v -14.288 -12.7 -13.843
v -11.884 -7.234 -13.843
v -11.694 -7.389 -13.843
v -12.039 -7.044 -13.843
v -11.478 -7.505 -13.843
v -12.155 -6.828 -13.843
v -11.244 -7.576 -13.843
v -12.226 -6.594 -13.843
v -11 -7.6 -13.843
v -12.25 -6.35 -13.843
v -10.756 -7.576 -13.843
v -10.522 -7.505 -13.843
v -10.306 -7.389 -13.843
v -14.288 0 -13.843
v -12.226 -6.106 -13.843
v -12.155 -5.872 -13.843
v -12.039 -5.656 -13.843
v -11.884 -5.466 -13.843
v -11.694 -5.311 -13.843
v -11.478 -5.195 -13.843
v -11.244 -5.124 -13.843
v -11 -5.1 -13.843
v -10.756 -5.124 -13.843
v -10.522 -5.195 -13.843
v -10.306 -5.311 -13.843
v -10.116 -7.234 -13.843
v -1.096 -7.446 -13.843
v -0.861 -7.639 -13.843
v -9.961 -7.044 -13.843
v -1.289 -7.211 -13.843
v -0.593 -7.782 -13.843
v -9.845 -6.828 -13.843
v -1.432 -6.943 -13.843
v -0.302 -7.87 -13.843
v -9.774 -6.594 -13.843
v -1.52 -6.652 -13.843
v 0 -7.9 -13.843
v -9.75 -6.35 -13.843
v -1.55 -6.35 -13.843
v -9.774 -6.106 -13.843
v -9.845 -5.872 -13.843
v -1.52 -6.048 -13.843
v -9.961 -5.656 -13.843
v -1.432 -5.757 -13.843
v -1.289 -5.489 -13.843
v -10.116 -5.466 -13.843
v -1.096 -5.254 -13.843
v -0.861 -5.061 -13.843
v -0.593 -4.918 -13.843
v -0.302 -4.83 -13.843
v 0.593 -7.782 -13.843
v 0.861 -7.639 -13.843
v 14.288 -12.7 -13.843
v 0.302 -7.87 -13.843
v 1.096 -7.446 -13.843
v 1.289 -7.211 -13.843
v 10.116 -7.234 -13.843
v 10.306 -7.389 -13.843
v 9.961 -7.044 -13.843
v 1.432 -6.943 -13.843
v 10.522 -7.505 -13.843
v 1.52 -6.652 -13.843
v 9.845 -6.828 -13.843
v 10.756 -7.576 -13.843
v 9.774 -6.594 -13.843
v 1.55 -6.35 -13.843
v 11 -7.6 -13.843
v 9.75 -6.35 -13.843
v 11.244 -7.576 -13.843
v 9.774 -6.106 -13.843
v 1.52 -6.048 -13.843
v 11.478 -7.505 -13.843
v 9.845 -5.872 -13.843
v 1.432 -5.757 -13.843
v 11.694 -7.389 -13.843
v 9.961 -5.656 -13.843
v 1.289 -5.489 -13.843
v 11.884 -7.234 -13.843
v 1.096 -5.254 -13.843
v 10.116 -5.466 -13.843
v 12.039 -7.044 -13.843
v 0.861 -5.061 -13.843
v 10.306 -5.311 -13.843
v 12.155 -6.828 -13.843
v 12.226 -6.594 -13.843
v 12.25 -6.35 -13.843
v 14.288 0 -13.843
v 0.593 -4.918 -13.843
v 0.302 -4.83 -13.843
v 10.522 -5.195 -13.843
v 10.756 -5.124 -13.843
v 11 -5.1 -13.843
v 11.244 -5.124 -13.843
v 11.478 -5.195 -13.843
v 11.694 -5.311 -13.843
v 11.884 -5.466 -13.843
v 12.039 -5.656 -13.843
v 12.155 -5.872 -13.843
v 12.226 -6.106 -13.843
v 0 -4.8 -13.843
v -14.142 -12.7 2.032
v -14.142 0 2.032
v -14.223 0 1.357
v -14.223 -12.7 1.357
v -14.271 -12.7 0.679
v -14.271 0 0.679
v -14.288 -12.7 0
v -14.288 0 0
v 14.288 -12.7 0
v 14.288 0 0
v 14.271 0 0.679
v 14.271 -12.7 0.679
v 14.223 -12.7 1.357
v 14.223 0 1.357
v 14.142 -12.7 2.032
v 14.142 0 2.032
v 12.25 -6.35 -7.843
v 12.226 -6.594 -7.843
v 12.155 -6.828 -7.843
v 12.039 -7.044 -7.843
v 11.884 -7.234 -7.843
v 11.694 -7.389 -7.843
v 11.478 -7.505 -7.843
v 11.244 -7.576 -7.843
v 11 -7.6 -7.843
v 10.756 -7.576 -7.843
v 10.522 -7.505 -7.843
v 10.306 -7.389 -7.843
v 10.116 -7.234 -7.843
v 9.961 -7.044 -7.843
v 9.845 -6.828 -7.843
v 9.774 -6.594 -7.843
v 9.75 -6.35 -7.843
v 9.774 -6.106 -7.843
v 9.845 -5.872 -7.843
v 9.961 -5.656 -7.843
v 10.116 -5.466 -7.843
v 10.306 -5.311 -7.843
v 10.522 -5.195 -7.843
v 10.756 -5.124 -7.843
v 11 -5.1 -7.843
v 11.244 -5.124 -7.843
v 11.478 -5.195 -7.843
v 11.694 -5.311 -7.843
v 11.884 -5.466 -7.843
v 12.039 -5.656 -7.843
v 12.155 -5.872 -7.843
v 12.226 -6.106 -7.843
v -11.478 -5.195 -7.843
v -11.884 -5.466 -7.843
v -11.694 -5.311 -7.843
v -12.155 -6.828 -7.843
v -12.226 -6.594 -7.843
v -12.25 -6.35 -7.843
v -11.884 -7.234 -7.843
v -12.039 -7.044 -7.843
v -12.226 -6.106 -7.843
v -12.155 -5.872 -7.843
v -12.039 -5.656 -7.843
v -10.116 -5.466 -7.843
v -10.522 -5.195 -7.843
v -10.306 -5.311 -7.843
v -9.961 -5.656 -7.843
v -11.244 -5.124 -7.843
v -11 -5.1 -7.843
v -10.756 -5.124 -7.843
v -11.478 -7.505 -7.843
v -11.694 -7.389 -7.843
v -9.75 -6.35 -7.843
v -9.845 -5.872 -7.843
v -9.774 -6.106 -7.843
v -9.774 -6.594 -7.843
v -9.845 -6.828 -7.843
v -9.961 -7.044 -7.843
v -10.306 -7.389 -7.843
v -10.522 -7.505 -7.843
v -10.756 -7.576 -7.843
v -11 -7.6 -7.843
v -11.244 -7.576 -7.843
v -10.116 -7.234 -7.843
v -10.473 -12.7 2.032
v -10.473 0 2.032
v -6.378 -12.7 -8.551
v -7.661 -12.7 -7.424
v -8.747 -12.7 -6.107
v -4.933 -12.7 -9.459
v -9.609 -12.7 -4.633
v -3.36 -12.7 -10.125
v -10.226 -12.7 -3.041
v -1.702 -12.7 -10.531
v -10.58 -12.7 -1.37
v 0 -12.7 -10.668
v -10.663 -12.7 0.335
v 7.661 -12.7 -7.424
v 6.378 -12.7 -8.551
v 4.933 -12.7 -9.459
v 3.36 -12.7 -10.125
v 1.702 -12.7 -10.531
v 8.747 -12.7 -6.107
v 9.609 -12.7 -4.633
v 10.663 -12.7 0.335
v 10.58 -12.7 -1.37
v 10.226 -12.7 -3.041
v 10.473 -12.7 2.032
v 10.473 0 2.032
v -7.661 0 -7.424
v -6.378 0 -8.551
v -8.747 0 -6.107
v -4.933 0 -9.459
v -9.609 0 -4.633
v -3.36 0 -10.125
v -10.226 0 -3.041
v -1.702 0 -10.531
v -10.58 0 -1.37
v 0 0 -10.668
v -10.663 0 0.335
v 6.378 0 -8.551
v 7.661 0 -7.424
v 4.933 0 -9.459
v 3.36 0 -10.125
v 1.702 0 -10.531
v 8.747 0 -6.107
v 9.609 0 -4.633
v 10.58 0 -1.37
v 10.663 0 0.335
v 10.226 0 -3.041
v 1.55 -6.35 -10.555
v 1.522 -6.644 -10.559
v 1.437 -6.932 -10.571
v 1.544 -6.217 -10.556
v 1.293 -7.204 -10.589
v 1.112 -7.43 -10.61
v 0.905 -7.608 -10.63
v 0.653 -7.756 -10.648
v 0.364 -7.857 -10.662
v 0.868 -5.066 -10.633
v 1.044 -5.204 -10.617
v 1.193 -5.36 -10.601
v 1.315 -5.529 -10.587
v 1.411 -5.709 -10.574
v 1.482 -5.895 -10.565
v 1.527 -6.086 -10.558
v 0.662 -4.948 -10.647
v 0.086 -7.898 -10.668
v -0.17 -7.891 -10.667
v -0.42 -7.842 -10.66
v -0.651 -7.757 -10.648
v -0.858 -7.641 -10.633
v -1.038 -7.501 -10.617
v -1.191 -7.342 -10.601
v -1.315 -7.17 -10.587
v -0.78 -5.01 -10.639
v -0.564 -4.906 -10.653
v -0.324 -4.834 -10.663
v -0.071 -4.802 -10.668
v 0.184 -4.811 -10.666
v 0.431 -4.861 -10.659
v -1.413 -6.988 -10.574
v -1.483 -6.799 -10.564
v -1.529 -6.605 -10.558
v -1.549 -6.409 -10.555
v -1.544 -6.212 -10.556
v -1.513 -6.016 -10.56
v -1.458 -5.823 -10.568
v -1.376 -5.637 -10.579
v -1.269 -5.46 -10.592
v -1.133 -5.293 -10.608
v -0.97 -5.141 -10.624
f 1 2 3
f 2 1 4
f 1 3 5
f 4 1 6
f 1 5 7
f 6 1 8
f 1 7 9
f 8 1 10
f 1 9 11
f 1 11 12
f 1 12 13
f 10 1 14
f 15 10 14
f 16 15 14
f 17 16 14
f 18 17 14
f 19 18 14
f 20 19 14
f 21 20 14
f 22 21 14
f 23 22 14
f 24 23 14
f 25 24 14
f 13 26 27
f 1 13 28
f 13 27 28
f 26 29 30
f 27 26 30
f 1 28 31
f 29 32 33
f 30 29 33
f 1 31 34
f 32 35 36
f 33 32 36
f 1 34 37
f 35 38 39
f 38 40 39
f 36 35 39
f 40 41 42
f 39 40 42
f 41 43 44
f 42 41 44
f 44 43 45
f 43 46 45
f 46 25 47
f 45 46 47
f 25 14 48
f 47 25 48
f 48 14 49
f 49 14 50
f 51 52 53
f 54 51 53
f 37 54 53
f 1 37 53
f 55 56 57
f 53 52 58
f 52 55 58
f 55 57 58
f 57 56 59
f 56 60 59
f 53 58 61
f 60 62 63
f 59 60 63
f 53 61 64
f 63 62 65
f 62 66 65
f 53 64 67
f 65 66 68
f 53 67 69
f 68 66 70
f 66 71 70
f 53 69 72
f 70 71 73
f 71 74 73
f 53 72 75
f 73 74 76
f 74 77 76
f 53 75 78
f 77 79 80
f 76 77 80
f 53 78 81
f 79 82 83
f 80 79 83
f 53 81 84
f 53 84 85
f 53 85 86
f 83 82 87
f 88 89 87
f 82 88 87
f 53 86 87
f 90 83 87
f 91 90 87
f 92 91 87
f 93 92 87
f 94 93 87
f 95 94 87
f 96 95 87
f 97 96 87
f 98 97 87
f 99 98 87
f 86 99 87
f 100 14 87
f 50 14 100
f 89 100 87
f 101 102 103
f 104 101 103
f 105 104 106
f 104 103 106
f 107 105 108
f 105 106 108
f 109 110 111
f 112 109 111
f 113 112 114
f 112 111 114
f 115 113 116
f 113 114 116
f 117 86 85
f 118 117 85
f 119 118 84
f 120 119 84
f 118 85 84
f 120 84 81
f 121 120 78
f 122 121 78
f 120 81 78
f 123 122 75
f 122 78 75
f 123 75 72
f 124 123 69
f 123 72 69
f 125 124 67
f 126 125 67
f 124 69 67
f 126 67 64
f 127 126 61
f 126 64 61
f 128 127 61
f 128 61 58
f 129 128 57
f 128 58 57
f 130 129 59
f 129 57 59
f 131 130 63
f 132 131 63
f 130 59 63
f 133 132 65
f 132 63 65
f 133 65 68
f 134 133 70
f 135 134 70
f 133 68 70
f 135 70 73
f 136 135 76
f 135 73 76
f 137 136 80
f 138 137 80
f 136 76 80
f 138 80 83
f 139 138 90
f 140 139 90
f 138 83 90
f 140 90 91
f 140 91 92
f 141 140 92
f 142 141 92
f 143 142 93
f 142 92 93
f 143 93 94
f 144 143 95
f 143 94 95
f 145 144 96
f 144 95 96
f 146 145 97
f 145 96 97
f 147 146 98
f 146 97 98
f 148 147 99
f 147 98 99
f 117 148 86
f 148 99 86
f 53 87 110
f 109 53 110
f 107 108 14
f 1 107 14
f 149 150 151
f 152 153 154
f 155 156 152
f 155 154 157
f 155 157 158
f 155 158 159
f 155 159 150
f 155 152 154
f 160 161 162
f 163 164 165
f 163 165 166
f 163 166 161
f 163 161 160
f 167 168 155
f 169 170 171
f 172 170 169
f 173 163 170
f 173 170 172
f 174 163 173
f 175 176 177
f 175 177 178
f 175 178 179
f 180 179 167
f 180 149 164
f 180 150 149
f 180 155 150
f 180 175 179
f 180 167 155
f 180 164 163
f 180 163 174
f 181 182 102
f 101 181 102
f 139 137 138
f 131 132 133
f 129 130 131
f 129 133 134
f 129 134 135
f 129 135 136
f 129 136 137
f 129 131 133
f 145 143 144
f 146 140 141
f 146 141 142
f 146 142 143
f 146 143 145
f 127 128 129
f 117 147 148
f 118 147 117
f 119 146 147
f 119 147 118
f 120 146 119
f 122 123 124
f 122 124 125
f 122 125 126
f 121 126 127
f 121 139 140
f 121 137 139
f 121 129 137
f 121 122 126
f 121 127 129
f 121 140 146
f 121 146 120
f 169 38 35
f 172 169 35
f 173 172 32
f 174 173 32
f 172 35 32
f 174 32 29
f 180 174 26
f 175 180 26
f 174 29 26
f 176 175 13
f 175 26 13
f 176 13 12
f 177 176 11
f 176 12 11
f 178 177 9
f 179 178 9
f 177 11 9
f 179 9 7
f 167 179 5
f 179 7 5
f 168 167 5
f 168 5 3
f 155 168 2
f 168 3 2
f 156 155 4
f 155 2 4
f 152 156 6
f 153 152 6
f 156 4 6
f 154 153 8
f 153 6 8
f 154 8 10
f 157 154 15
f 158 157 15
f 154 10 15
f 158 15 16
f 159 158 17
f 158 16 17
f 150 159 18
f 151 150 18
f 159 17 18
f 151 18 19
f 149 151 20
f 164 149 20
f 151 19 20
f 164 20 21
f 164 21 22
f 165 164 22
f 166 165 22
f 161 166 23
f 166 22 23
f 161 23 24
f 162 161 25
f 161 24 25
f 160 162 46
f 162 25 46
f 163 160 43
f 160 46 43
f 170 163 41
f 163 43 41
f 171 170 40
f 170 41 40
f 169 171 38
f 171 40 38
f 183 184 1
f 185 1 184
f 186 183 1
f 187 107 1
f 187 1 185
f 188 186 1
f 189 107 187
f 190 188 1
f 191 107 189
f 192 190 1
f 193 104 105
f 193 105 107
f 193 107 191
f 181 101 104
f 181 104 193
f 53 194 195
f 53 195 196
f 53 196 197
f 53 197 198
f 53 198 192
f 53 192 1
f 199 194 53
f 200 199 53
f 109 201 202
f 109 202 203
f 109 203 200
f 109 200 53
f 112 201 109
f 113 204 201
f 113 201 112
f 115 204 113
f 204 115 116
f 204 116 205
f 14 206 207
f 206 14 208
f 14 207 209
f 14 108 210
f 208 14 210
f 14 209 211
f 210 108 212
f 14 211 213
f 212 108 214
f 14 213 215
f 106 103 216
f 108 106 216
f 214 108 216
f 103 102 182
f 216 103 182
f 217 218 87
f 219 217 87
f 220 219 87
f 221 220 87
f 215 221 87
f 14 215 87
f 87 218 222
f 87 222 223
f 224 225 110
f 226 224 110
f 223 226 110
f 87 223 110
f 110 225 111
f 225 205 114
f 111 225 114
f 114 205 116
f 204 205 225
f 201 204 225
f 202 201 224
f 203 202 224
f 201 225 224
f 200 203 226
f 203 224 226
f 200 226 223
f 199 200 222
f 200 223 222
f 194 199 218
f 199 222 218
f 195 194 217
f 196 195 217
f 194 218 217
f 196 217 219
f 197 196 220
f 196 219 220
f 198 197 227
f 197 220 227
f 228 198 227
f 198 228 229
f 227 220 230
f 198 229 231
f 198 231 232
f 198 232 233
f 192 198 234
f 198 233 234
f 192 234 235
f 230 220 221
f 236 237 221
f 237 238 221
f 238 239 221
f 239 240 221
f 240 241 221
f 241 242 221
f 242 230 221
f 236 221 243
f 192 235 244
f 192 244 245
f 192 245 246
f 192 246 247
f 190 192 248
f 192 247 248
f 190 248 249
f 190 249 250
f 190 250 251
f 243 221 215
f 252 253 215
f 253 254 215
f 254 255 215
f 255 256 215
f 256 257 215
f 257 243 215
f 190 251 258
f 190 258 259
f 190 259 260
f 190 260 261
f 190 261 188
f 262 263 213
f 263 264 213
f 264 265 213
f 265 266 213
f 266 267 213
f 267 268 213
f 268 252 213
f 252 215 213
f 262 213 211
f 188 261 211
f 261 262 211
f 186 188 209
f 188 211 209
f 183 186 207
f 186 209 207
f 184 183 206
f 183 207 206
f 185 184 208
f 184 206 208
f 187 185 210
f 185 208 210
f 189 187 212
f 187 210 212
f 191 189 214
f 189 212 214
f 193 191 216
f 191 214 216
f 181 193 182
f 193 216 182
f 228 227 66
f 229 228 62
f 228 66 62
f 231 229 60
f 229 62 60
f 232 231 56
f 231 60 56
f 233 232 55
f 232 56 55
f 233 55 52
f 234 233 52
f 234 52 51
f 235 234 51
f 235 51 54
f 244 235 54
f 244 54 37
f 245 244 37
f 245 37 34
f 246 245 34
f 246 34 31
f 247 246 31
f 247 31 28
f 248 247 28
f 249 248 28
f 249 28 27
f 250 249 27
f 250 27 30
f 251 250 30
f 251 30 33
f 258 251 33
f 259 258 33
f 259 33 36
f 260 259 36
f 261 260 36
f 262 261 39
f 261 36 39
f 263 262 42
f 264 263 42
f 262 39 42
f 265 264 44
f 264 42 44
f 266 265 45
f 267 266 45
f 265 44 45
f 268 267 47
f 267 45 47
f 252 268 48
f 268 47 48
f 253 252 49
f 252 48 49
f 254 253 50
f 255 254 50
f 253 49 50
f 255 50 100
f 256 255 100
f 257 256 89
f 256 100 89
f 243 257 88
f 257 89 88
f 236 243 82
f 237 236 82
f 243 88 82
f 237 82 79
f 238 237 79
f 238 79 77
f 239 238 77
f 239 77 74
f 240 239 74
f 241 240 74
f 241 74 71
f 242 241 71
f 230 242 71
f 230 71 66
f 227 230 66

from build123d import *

# Parameters (mm, degrees)
F1_DEPTH = 12.7
F2_R     = 1.25
F2_R_2   = 1.55
F3_DEPTH = 6


with BuildPart() as f1:
    # F0 (on Front) → F1 (new body)
    with BuildSketch(Plane.XZ):
        with BuildLine():
            ThreePointArc((10.472688, 2.032), (0, -10.668), (-10.472688, 2.032))
            Line((-10.472688, 2.032), (-14.142264, 2.032))
            ThreePointArc((-14.142264, 2.032), (-14.251145, 1.018592), (-14.2875, 0))
            Line((-14.2875, 0), (-14.2875, -13.843))
            Line((-14.2875, -13.843), (14.2875, -13.843))
            Line((14.2875, -13.843), (14.2875, 0))
            ThreePointArc((14.2875, 0), (14.251145, 1.018592), (14.142264, 2.032))
            Line((14.142264, 2.032), (10.472688, 2.032))
        make_face()
    extrude(amount=F1_DEPTH)

    # F2 (on face) → F3 (cut)
    with BuildSketch(Plane(origin=(0, 0, -13.843), x_dir=(1, 0, 0), z_dir=(0, 0, -1))):
        with Locations((-11, 6.35)):
            Circle(F2_R)
        with Locations((11, 6.35)):
            Circle(F2_R)
        with Locations((0, 6.35)):
            Circle(F2_R_2)
    extrude(amount=-F3_DEPTH, mode=Mode.SUBTRACT)


solid = f1.part
